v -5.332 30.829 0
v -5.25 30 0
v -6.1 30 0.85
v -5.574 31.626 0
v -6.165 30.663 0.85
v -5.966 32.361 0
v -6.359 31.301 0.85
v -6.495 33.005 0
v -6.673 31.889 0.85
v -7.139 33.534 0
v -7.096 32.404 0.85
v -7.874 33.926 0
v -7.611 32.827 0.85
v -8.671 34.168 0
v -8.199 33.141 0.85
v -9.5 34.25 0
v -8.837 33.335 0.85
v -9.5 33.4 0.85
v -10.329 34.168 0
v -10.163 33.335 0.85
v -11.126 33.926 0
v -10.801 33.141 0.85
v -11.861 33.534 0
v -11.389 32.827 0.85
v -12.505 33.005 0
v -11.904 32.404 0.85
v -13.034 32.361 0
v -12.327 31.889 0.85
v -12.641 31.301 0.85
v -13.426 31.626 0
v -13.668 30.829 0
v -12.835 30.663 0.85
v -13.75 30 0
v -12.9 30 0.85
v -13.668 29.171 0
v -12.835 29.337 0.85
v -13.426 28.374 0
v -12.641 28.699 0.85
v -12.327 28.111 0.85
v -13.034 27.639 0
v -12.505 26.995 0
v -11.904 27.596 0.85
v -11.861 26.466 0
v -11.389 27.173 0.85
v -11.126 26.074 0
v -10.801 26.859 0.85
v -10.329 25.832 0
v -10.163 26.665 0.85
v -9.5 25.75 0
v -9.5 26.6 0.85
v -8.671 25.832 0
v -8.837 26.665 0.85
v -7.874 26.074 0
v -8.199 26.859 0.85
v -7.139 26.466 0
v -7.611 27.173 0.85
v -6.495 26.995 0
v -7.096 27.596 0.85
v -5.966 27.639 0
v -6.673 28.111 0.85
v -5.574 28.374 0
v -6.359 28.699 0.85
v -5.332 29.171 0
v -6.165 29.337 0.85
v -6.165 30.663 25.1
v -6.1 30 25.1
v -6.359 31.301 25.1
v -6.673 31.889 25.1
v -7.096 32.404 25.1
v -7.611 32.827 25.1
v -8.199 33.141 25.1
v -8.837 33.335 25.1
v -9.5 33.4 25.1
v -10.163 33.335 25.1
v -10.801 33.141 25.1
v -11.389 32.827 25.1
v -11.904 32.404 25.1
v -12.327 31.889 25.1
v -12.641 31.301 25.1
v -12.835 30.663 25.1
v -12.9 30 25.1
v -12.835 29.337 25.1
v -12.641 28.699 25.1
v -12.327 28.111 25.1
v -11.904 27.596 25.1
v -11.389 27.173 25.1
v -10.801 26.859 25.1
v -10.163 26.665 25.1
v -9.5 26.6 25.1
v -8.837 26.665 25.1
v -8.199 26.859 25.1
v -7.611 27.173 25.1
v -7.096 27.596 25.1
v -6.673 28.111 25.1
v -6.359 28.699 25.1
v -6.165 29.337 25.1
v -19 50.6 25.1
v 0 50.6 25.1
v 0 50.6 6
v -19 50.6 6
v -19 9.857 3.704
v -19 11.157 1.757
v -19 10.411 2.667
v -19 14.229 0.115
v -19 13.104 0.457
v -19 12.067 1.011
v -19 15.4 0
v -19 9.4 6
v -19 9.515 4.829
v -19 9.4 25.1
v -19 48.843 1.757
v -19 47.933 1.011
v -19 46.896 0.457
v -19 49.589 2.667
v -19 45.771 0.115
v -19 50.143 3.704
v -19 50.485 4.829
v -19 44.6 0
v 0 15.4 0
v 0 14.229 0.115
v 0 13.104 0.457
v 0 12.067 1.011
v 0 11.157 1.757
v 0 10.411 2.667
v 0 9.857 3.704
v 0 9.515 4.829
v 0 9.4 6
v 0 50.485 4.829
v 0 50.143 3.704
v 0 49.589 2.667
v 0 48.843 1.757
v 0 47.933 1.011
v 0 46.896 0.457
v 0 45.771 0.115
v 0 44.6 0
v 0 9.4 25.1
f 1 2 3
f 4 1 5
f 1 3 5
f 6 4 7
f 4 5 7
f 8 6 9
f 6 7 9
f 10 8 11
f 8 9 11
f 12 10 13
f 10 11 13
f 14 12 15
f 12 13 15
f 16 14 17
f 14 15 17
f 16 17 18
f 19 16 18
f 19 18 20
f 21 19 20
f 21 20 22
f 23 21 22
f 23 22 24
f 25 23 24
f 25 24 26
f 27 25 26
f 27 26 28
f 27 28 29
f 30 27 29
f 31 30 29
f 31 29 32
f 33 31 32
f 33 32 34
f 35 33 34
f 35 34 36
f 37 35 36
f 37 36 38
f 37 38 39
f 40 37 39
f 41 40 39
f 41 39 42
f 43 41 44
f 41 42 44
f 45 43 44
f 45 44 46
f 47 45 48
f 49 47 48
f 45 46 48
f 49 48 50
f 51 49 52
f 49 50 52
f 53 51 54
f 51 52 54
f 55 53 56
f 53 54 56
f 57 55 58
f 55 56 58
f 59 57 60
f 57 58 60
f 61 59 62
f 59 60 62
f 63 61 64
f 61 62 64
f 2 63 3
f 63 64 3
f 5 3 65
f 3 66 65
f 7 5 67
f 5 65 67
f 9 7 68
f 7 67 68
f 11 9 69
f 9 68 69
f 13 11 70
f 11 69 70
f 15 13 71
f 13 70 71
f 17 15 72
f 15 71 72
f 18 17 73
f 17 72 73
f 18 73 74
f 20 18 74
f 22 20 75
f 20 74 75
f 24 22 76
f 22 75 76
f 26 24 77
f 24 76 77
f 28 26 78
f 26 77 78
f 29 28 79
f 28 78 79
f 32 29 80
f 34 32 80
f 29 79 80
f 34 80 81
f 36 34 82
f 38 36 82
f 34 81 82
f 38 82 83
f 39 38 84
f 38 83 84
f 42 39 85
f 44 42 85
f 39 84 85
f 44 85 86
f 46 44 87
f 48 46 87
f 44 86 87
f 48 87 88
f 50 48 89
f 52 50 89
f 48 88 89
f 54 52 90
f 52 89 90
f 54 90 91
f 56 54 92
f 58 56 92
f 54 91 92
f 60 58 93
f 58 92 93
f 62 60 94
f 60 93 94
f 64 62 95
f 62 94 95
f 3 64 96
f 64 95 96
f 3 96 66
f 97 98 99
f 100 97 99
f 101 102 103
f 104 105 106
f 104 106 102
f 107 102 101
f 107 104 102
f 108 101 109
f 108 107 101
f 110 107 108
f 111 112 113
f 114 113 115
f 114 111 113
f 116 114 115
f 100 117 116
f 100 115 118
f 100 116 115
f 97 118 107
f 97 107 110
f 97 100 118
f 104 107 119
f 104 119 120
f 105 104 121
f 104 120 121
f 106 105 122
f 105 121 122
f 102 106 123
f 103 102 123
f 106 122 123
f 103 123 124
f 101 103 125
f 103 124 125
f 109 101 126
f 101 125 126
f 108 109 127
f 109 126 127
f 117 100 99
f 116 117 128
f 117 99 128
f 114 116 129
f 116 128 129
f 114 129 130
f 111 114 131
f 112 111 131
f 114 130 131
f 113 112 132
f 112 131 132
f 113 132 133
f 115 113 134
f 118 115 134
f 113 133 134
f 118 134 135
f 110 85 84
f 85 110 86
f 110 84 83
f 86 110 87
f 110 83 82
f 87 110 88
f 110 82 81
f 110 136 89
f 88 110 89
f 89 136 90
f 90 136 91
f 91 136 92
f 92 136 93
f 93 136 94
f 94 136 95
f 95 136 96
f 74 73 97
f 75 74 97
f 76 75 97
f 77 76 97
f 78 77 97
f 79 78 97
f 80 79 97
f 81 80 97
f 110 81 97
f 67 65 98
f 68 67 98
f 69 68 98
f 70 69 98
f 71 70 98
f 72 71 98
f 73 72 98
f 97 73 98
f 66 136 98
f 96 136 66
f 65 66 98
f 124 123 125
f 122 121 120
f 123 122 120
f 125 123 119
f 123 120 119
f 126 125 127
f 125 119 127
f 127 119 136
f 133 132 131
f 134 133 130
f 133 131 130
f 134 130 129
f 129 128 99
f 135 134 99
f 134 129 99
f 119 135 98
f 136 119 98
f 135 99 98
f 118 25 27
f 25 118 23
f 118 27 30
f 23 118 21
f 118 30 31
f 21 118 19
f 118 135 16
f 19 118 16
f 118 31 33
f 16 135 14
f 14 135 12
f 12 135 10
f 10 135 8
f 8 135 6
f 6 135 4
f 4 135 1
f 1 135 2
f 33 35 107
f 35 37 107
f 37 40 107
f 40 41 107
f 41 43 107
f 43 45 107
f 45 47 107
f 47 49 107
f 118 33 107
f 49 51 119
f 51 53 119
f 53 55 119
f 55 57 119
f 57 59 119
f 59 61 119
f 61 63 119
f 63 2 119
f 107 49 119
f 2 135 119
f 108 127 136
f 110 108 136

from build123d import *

# Parameters (mm, degrees)
EXTRUDE_1_DEPTH      = 19
M8X1_251_D           = 6.8
M8X1_251_DEPTH       = 28.25
M8X1_251_CSINK_D     = 8.5
M8X1_251_CSINK_ANGLE = 90
M8X1_251_TIP         = 2.042926105


with BuildPart() as part:
    # Эскиз1 → Бобышка-Вытянуть1 (new body)
    with BuildSketch(Plane(origin=(0, 0, 0), x_dir=(0, 0, -1), z_dir=(1, 0, 0))):
        with BuildLine():
            Line((-6, 9.4), (-25.1, 9.4))
            Line((-25.1, 9.4), (-25.1, 50.6))
            Line((-25.1, 50.6), (-6, 50.6))
            ThreePointArc((-6, 50.6), (-1.757359313, 48.842640687), (0, 44.6))
            Line((0, 44.6), (0, 15.4))
            ThreePointArc((0, 15.4), (-1.757359313, 11.157359313), (-6, 9.4))
        make_face()
    extrude(amount=-EXTRUDE_1_DEPTH)

    # Отверстие обработанное метчиком M8x1.251
    with Locations(Plane(origin=(0, 0, 0), x_dir=(-1, 0, 0), z_dir=(0, 0, -1))):
        with Locations((9.5, 30)):
            CounterSinkHole(M8X1_251_D / 2, M8X1_251_CSINK_D / 2, depth=M8X1_251_DEPTH, counter_sink_angle=M8X1_251_CSINK_ANGLE)
            with Locations((0, 0, -(M8X1_251_DEPTH + M8X1_251_TIP / 2))):  # 118° drill point
                Cone(0, M8X1_251_D / 2, M8X1_251_TIP, mode=Mode.SUBTRACT)


solid = part.part
